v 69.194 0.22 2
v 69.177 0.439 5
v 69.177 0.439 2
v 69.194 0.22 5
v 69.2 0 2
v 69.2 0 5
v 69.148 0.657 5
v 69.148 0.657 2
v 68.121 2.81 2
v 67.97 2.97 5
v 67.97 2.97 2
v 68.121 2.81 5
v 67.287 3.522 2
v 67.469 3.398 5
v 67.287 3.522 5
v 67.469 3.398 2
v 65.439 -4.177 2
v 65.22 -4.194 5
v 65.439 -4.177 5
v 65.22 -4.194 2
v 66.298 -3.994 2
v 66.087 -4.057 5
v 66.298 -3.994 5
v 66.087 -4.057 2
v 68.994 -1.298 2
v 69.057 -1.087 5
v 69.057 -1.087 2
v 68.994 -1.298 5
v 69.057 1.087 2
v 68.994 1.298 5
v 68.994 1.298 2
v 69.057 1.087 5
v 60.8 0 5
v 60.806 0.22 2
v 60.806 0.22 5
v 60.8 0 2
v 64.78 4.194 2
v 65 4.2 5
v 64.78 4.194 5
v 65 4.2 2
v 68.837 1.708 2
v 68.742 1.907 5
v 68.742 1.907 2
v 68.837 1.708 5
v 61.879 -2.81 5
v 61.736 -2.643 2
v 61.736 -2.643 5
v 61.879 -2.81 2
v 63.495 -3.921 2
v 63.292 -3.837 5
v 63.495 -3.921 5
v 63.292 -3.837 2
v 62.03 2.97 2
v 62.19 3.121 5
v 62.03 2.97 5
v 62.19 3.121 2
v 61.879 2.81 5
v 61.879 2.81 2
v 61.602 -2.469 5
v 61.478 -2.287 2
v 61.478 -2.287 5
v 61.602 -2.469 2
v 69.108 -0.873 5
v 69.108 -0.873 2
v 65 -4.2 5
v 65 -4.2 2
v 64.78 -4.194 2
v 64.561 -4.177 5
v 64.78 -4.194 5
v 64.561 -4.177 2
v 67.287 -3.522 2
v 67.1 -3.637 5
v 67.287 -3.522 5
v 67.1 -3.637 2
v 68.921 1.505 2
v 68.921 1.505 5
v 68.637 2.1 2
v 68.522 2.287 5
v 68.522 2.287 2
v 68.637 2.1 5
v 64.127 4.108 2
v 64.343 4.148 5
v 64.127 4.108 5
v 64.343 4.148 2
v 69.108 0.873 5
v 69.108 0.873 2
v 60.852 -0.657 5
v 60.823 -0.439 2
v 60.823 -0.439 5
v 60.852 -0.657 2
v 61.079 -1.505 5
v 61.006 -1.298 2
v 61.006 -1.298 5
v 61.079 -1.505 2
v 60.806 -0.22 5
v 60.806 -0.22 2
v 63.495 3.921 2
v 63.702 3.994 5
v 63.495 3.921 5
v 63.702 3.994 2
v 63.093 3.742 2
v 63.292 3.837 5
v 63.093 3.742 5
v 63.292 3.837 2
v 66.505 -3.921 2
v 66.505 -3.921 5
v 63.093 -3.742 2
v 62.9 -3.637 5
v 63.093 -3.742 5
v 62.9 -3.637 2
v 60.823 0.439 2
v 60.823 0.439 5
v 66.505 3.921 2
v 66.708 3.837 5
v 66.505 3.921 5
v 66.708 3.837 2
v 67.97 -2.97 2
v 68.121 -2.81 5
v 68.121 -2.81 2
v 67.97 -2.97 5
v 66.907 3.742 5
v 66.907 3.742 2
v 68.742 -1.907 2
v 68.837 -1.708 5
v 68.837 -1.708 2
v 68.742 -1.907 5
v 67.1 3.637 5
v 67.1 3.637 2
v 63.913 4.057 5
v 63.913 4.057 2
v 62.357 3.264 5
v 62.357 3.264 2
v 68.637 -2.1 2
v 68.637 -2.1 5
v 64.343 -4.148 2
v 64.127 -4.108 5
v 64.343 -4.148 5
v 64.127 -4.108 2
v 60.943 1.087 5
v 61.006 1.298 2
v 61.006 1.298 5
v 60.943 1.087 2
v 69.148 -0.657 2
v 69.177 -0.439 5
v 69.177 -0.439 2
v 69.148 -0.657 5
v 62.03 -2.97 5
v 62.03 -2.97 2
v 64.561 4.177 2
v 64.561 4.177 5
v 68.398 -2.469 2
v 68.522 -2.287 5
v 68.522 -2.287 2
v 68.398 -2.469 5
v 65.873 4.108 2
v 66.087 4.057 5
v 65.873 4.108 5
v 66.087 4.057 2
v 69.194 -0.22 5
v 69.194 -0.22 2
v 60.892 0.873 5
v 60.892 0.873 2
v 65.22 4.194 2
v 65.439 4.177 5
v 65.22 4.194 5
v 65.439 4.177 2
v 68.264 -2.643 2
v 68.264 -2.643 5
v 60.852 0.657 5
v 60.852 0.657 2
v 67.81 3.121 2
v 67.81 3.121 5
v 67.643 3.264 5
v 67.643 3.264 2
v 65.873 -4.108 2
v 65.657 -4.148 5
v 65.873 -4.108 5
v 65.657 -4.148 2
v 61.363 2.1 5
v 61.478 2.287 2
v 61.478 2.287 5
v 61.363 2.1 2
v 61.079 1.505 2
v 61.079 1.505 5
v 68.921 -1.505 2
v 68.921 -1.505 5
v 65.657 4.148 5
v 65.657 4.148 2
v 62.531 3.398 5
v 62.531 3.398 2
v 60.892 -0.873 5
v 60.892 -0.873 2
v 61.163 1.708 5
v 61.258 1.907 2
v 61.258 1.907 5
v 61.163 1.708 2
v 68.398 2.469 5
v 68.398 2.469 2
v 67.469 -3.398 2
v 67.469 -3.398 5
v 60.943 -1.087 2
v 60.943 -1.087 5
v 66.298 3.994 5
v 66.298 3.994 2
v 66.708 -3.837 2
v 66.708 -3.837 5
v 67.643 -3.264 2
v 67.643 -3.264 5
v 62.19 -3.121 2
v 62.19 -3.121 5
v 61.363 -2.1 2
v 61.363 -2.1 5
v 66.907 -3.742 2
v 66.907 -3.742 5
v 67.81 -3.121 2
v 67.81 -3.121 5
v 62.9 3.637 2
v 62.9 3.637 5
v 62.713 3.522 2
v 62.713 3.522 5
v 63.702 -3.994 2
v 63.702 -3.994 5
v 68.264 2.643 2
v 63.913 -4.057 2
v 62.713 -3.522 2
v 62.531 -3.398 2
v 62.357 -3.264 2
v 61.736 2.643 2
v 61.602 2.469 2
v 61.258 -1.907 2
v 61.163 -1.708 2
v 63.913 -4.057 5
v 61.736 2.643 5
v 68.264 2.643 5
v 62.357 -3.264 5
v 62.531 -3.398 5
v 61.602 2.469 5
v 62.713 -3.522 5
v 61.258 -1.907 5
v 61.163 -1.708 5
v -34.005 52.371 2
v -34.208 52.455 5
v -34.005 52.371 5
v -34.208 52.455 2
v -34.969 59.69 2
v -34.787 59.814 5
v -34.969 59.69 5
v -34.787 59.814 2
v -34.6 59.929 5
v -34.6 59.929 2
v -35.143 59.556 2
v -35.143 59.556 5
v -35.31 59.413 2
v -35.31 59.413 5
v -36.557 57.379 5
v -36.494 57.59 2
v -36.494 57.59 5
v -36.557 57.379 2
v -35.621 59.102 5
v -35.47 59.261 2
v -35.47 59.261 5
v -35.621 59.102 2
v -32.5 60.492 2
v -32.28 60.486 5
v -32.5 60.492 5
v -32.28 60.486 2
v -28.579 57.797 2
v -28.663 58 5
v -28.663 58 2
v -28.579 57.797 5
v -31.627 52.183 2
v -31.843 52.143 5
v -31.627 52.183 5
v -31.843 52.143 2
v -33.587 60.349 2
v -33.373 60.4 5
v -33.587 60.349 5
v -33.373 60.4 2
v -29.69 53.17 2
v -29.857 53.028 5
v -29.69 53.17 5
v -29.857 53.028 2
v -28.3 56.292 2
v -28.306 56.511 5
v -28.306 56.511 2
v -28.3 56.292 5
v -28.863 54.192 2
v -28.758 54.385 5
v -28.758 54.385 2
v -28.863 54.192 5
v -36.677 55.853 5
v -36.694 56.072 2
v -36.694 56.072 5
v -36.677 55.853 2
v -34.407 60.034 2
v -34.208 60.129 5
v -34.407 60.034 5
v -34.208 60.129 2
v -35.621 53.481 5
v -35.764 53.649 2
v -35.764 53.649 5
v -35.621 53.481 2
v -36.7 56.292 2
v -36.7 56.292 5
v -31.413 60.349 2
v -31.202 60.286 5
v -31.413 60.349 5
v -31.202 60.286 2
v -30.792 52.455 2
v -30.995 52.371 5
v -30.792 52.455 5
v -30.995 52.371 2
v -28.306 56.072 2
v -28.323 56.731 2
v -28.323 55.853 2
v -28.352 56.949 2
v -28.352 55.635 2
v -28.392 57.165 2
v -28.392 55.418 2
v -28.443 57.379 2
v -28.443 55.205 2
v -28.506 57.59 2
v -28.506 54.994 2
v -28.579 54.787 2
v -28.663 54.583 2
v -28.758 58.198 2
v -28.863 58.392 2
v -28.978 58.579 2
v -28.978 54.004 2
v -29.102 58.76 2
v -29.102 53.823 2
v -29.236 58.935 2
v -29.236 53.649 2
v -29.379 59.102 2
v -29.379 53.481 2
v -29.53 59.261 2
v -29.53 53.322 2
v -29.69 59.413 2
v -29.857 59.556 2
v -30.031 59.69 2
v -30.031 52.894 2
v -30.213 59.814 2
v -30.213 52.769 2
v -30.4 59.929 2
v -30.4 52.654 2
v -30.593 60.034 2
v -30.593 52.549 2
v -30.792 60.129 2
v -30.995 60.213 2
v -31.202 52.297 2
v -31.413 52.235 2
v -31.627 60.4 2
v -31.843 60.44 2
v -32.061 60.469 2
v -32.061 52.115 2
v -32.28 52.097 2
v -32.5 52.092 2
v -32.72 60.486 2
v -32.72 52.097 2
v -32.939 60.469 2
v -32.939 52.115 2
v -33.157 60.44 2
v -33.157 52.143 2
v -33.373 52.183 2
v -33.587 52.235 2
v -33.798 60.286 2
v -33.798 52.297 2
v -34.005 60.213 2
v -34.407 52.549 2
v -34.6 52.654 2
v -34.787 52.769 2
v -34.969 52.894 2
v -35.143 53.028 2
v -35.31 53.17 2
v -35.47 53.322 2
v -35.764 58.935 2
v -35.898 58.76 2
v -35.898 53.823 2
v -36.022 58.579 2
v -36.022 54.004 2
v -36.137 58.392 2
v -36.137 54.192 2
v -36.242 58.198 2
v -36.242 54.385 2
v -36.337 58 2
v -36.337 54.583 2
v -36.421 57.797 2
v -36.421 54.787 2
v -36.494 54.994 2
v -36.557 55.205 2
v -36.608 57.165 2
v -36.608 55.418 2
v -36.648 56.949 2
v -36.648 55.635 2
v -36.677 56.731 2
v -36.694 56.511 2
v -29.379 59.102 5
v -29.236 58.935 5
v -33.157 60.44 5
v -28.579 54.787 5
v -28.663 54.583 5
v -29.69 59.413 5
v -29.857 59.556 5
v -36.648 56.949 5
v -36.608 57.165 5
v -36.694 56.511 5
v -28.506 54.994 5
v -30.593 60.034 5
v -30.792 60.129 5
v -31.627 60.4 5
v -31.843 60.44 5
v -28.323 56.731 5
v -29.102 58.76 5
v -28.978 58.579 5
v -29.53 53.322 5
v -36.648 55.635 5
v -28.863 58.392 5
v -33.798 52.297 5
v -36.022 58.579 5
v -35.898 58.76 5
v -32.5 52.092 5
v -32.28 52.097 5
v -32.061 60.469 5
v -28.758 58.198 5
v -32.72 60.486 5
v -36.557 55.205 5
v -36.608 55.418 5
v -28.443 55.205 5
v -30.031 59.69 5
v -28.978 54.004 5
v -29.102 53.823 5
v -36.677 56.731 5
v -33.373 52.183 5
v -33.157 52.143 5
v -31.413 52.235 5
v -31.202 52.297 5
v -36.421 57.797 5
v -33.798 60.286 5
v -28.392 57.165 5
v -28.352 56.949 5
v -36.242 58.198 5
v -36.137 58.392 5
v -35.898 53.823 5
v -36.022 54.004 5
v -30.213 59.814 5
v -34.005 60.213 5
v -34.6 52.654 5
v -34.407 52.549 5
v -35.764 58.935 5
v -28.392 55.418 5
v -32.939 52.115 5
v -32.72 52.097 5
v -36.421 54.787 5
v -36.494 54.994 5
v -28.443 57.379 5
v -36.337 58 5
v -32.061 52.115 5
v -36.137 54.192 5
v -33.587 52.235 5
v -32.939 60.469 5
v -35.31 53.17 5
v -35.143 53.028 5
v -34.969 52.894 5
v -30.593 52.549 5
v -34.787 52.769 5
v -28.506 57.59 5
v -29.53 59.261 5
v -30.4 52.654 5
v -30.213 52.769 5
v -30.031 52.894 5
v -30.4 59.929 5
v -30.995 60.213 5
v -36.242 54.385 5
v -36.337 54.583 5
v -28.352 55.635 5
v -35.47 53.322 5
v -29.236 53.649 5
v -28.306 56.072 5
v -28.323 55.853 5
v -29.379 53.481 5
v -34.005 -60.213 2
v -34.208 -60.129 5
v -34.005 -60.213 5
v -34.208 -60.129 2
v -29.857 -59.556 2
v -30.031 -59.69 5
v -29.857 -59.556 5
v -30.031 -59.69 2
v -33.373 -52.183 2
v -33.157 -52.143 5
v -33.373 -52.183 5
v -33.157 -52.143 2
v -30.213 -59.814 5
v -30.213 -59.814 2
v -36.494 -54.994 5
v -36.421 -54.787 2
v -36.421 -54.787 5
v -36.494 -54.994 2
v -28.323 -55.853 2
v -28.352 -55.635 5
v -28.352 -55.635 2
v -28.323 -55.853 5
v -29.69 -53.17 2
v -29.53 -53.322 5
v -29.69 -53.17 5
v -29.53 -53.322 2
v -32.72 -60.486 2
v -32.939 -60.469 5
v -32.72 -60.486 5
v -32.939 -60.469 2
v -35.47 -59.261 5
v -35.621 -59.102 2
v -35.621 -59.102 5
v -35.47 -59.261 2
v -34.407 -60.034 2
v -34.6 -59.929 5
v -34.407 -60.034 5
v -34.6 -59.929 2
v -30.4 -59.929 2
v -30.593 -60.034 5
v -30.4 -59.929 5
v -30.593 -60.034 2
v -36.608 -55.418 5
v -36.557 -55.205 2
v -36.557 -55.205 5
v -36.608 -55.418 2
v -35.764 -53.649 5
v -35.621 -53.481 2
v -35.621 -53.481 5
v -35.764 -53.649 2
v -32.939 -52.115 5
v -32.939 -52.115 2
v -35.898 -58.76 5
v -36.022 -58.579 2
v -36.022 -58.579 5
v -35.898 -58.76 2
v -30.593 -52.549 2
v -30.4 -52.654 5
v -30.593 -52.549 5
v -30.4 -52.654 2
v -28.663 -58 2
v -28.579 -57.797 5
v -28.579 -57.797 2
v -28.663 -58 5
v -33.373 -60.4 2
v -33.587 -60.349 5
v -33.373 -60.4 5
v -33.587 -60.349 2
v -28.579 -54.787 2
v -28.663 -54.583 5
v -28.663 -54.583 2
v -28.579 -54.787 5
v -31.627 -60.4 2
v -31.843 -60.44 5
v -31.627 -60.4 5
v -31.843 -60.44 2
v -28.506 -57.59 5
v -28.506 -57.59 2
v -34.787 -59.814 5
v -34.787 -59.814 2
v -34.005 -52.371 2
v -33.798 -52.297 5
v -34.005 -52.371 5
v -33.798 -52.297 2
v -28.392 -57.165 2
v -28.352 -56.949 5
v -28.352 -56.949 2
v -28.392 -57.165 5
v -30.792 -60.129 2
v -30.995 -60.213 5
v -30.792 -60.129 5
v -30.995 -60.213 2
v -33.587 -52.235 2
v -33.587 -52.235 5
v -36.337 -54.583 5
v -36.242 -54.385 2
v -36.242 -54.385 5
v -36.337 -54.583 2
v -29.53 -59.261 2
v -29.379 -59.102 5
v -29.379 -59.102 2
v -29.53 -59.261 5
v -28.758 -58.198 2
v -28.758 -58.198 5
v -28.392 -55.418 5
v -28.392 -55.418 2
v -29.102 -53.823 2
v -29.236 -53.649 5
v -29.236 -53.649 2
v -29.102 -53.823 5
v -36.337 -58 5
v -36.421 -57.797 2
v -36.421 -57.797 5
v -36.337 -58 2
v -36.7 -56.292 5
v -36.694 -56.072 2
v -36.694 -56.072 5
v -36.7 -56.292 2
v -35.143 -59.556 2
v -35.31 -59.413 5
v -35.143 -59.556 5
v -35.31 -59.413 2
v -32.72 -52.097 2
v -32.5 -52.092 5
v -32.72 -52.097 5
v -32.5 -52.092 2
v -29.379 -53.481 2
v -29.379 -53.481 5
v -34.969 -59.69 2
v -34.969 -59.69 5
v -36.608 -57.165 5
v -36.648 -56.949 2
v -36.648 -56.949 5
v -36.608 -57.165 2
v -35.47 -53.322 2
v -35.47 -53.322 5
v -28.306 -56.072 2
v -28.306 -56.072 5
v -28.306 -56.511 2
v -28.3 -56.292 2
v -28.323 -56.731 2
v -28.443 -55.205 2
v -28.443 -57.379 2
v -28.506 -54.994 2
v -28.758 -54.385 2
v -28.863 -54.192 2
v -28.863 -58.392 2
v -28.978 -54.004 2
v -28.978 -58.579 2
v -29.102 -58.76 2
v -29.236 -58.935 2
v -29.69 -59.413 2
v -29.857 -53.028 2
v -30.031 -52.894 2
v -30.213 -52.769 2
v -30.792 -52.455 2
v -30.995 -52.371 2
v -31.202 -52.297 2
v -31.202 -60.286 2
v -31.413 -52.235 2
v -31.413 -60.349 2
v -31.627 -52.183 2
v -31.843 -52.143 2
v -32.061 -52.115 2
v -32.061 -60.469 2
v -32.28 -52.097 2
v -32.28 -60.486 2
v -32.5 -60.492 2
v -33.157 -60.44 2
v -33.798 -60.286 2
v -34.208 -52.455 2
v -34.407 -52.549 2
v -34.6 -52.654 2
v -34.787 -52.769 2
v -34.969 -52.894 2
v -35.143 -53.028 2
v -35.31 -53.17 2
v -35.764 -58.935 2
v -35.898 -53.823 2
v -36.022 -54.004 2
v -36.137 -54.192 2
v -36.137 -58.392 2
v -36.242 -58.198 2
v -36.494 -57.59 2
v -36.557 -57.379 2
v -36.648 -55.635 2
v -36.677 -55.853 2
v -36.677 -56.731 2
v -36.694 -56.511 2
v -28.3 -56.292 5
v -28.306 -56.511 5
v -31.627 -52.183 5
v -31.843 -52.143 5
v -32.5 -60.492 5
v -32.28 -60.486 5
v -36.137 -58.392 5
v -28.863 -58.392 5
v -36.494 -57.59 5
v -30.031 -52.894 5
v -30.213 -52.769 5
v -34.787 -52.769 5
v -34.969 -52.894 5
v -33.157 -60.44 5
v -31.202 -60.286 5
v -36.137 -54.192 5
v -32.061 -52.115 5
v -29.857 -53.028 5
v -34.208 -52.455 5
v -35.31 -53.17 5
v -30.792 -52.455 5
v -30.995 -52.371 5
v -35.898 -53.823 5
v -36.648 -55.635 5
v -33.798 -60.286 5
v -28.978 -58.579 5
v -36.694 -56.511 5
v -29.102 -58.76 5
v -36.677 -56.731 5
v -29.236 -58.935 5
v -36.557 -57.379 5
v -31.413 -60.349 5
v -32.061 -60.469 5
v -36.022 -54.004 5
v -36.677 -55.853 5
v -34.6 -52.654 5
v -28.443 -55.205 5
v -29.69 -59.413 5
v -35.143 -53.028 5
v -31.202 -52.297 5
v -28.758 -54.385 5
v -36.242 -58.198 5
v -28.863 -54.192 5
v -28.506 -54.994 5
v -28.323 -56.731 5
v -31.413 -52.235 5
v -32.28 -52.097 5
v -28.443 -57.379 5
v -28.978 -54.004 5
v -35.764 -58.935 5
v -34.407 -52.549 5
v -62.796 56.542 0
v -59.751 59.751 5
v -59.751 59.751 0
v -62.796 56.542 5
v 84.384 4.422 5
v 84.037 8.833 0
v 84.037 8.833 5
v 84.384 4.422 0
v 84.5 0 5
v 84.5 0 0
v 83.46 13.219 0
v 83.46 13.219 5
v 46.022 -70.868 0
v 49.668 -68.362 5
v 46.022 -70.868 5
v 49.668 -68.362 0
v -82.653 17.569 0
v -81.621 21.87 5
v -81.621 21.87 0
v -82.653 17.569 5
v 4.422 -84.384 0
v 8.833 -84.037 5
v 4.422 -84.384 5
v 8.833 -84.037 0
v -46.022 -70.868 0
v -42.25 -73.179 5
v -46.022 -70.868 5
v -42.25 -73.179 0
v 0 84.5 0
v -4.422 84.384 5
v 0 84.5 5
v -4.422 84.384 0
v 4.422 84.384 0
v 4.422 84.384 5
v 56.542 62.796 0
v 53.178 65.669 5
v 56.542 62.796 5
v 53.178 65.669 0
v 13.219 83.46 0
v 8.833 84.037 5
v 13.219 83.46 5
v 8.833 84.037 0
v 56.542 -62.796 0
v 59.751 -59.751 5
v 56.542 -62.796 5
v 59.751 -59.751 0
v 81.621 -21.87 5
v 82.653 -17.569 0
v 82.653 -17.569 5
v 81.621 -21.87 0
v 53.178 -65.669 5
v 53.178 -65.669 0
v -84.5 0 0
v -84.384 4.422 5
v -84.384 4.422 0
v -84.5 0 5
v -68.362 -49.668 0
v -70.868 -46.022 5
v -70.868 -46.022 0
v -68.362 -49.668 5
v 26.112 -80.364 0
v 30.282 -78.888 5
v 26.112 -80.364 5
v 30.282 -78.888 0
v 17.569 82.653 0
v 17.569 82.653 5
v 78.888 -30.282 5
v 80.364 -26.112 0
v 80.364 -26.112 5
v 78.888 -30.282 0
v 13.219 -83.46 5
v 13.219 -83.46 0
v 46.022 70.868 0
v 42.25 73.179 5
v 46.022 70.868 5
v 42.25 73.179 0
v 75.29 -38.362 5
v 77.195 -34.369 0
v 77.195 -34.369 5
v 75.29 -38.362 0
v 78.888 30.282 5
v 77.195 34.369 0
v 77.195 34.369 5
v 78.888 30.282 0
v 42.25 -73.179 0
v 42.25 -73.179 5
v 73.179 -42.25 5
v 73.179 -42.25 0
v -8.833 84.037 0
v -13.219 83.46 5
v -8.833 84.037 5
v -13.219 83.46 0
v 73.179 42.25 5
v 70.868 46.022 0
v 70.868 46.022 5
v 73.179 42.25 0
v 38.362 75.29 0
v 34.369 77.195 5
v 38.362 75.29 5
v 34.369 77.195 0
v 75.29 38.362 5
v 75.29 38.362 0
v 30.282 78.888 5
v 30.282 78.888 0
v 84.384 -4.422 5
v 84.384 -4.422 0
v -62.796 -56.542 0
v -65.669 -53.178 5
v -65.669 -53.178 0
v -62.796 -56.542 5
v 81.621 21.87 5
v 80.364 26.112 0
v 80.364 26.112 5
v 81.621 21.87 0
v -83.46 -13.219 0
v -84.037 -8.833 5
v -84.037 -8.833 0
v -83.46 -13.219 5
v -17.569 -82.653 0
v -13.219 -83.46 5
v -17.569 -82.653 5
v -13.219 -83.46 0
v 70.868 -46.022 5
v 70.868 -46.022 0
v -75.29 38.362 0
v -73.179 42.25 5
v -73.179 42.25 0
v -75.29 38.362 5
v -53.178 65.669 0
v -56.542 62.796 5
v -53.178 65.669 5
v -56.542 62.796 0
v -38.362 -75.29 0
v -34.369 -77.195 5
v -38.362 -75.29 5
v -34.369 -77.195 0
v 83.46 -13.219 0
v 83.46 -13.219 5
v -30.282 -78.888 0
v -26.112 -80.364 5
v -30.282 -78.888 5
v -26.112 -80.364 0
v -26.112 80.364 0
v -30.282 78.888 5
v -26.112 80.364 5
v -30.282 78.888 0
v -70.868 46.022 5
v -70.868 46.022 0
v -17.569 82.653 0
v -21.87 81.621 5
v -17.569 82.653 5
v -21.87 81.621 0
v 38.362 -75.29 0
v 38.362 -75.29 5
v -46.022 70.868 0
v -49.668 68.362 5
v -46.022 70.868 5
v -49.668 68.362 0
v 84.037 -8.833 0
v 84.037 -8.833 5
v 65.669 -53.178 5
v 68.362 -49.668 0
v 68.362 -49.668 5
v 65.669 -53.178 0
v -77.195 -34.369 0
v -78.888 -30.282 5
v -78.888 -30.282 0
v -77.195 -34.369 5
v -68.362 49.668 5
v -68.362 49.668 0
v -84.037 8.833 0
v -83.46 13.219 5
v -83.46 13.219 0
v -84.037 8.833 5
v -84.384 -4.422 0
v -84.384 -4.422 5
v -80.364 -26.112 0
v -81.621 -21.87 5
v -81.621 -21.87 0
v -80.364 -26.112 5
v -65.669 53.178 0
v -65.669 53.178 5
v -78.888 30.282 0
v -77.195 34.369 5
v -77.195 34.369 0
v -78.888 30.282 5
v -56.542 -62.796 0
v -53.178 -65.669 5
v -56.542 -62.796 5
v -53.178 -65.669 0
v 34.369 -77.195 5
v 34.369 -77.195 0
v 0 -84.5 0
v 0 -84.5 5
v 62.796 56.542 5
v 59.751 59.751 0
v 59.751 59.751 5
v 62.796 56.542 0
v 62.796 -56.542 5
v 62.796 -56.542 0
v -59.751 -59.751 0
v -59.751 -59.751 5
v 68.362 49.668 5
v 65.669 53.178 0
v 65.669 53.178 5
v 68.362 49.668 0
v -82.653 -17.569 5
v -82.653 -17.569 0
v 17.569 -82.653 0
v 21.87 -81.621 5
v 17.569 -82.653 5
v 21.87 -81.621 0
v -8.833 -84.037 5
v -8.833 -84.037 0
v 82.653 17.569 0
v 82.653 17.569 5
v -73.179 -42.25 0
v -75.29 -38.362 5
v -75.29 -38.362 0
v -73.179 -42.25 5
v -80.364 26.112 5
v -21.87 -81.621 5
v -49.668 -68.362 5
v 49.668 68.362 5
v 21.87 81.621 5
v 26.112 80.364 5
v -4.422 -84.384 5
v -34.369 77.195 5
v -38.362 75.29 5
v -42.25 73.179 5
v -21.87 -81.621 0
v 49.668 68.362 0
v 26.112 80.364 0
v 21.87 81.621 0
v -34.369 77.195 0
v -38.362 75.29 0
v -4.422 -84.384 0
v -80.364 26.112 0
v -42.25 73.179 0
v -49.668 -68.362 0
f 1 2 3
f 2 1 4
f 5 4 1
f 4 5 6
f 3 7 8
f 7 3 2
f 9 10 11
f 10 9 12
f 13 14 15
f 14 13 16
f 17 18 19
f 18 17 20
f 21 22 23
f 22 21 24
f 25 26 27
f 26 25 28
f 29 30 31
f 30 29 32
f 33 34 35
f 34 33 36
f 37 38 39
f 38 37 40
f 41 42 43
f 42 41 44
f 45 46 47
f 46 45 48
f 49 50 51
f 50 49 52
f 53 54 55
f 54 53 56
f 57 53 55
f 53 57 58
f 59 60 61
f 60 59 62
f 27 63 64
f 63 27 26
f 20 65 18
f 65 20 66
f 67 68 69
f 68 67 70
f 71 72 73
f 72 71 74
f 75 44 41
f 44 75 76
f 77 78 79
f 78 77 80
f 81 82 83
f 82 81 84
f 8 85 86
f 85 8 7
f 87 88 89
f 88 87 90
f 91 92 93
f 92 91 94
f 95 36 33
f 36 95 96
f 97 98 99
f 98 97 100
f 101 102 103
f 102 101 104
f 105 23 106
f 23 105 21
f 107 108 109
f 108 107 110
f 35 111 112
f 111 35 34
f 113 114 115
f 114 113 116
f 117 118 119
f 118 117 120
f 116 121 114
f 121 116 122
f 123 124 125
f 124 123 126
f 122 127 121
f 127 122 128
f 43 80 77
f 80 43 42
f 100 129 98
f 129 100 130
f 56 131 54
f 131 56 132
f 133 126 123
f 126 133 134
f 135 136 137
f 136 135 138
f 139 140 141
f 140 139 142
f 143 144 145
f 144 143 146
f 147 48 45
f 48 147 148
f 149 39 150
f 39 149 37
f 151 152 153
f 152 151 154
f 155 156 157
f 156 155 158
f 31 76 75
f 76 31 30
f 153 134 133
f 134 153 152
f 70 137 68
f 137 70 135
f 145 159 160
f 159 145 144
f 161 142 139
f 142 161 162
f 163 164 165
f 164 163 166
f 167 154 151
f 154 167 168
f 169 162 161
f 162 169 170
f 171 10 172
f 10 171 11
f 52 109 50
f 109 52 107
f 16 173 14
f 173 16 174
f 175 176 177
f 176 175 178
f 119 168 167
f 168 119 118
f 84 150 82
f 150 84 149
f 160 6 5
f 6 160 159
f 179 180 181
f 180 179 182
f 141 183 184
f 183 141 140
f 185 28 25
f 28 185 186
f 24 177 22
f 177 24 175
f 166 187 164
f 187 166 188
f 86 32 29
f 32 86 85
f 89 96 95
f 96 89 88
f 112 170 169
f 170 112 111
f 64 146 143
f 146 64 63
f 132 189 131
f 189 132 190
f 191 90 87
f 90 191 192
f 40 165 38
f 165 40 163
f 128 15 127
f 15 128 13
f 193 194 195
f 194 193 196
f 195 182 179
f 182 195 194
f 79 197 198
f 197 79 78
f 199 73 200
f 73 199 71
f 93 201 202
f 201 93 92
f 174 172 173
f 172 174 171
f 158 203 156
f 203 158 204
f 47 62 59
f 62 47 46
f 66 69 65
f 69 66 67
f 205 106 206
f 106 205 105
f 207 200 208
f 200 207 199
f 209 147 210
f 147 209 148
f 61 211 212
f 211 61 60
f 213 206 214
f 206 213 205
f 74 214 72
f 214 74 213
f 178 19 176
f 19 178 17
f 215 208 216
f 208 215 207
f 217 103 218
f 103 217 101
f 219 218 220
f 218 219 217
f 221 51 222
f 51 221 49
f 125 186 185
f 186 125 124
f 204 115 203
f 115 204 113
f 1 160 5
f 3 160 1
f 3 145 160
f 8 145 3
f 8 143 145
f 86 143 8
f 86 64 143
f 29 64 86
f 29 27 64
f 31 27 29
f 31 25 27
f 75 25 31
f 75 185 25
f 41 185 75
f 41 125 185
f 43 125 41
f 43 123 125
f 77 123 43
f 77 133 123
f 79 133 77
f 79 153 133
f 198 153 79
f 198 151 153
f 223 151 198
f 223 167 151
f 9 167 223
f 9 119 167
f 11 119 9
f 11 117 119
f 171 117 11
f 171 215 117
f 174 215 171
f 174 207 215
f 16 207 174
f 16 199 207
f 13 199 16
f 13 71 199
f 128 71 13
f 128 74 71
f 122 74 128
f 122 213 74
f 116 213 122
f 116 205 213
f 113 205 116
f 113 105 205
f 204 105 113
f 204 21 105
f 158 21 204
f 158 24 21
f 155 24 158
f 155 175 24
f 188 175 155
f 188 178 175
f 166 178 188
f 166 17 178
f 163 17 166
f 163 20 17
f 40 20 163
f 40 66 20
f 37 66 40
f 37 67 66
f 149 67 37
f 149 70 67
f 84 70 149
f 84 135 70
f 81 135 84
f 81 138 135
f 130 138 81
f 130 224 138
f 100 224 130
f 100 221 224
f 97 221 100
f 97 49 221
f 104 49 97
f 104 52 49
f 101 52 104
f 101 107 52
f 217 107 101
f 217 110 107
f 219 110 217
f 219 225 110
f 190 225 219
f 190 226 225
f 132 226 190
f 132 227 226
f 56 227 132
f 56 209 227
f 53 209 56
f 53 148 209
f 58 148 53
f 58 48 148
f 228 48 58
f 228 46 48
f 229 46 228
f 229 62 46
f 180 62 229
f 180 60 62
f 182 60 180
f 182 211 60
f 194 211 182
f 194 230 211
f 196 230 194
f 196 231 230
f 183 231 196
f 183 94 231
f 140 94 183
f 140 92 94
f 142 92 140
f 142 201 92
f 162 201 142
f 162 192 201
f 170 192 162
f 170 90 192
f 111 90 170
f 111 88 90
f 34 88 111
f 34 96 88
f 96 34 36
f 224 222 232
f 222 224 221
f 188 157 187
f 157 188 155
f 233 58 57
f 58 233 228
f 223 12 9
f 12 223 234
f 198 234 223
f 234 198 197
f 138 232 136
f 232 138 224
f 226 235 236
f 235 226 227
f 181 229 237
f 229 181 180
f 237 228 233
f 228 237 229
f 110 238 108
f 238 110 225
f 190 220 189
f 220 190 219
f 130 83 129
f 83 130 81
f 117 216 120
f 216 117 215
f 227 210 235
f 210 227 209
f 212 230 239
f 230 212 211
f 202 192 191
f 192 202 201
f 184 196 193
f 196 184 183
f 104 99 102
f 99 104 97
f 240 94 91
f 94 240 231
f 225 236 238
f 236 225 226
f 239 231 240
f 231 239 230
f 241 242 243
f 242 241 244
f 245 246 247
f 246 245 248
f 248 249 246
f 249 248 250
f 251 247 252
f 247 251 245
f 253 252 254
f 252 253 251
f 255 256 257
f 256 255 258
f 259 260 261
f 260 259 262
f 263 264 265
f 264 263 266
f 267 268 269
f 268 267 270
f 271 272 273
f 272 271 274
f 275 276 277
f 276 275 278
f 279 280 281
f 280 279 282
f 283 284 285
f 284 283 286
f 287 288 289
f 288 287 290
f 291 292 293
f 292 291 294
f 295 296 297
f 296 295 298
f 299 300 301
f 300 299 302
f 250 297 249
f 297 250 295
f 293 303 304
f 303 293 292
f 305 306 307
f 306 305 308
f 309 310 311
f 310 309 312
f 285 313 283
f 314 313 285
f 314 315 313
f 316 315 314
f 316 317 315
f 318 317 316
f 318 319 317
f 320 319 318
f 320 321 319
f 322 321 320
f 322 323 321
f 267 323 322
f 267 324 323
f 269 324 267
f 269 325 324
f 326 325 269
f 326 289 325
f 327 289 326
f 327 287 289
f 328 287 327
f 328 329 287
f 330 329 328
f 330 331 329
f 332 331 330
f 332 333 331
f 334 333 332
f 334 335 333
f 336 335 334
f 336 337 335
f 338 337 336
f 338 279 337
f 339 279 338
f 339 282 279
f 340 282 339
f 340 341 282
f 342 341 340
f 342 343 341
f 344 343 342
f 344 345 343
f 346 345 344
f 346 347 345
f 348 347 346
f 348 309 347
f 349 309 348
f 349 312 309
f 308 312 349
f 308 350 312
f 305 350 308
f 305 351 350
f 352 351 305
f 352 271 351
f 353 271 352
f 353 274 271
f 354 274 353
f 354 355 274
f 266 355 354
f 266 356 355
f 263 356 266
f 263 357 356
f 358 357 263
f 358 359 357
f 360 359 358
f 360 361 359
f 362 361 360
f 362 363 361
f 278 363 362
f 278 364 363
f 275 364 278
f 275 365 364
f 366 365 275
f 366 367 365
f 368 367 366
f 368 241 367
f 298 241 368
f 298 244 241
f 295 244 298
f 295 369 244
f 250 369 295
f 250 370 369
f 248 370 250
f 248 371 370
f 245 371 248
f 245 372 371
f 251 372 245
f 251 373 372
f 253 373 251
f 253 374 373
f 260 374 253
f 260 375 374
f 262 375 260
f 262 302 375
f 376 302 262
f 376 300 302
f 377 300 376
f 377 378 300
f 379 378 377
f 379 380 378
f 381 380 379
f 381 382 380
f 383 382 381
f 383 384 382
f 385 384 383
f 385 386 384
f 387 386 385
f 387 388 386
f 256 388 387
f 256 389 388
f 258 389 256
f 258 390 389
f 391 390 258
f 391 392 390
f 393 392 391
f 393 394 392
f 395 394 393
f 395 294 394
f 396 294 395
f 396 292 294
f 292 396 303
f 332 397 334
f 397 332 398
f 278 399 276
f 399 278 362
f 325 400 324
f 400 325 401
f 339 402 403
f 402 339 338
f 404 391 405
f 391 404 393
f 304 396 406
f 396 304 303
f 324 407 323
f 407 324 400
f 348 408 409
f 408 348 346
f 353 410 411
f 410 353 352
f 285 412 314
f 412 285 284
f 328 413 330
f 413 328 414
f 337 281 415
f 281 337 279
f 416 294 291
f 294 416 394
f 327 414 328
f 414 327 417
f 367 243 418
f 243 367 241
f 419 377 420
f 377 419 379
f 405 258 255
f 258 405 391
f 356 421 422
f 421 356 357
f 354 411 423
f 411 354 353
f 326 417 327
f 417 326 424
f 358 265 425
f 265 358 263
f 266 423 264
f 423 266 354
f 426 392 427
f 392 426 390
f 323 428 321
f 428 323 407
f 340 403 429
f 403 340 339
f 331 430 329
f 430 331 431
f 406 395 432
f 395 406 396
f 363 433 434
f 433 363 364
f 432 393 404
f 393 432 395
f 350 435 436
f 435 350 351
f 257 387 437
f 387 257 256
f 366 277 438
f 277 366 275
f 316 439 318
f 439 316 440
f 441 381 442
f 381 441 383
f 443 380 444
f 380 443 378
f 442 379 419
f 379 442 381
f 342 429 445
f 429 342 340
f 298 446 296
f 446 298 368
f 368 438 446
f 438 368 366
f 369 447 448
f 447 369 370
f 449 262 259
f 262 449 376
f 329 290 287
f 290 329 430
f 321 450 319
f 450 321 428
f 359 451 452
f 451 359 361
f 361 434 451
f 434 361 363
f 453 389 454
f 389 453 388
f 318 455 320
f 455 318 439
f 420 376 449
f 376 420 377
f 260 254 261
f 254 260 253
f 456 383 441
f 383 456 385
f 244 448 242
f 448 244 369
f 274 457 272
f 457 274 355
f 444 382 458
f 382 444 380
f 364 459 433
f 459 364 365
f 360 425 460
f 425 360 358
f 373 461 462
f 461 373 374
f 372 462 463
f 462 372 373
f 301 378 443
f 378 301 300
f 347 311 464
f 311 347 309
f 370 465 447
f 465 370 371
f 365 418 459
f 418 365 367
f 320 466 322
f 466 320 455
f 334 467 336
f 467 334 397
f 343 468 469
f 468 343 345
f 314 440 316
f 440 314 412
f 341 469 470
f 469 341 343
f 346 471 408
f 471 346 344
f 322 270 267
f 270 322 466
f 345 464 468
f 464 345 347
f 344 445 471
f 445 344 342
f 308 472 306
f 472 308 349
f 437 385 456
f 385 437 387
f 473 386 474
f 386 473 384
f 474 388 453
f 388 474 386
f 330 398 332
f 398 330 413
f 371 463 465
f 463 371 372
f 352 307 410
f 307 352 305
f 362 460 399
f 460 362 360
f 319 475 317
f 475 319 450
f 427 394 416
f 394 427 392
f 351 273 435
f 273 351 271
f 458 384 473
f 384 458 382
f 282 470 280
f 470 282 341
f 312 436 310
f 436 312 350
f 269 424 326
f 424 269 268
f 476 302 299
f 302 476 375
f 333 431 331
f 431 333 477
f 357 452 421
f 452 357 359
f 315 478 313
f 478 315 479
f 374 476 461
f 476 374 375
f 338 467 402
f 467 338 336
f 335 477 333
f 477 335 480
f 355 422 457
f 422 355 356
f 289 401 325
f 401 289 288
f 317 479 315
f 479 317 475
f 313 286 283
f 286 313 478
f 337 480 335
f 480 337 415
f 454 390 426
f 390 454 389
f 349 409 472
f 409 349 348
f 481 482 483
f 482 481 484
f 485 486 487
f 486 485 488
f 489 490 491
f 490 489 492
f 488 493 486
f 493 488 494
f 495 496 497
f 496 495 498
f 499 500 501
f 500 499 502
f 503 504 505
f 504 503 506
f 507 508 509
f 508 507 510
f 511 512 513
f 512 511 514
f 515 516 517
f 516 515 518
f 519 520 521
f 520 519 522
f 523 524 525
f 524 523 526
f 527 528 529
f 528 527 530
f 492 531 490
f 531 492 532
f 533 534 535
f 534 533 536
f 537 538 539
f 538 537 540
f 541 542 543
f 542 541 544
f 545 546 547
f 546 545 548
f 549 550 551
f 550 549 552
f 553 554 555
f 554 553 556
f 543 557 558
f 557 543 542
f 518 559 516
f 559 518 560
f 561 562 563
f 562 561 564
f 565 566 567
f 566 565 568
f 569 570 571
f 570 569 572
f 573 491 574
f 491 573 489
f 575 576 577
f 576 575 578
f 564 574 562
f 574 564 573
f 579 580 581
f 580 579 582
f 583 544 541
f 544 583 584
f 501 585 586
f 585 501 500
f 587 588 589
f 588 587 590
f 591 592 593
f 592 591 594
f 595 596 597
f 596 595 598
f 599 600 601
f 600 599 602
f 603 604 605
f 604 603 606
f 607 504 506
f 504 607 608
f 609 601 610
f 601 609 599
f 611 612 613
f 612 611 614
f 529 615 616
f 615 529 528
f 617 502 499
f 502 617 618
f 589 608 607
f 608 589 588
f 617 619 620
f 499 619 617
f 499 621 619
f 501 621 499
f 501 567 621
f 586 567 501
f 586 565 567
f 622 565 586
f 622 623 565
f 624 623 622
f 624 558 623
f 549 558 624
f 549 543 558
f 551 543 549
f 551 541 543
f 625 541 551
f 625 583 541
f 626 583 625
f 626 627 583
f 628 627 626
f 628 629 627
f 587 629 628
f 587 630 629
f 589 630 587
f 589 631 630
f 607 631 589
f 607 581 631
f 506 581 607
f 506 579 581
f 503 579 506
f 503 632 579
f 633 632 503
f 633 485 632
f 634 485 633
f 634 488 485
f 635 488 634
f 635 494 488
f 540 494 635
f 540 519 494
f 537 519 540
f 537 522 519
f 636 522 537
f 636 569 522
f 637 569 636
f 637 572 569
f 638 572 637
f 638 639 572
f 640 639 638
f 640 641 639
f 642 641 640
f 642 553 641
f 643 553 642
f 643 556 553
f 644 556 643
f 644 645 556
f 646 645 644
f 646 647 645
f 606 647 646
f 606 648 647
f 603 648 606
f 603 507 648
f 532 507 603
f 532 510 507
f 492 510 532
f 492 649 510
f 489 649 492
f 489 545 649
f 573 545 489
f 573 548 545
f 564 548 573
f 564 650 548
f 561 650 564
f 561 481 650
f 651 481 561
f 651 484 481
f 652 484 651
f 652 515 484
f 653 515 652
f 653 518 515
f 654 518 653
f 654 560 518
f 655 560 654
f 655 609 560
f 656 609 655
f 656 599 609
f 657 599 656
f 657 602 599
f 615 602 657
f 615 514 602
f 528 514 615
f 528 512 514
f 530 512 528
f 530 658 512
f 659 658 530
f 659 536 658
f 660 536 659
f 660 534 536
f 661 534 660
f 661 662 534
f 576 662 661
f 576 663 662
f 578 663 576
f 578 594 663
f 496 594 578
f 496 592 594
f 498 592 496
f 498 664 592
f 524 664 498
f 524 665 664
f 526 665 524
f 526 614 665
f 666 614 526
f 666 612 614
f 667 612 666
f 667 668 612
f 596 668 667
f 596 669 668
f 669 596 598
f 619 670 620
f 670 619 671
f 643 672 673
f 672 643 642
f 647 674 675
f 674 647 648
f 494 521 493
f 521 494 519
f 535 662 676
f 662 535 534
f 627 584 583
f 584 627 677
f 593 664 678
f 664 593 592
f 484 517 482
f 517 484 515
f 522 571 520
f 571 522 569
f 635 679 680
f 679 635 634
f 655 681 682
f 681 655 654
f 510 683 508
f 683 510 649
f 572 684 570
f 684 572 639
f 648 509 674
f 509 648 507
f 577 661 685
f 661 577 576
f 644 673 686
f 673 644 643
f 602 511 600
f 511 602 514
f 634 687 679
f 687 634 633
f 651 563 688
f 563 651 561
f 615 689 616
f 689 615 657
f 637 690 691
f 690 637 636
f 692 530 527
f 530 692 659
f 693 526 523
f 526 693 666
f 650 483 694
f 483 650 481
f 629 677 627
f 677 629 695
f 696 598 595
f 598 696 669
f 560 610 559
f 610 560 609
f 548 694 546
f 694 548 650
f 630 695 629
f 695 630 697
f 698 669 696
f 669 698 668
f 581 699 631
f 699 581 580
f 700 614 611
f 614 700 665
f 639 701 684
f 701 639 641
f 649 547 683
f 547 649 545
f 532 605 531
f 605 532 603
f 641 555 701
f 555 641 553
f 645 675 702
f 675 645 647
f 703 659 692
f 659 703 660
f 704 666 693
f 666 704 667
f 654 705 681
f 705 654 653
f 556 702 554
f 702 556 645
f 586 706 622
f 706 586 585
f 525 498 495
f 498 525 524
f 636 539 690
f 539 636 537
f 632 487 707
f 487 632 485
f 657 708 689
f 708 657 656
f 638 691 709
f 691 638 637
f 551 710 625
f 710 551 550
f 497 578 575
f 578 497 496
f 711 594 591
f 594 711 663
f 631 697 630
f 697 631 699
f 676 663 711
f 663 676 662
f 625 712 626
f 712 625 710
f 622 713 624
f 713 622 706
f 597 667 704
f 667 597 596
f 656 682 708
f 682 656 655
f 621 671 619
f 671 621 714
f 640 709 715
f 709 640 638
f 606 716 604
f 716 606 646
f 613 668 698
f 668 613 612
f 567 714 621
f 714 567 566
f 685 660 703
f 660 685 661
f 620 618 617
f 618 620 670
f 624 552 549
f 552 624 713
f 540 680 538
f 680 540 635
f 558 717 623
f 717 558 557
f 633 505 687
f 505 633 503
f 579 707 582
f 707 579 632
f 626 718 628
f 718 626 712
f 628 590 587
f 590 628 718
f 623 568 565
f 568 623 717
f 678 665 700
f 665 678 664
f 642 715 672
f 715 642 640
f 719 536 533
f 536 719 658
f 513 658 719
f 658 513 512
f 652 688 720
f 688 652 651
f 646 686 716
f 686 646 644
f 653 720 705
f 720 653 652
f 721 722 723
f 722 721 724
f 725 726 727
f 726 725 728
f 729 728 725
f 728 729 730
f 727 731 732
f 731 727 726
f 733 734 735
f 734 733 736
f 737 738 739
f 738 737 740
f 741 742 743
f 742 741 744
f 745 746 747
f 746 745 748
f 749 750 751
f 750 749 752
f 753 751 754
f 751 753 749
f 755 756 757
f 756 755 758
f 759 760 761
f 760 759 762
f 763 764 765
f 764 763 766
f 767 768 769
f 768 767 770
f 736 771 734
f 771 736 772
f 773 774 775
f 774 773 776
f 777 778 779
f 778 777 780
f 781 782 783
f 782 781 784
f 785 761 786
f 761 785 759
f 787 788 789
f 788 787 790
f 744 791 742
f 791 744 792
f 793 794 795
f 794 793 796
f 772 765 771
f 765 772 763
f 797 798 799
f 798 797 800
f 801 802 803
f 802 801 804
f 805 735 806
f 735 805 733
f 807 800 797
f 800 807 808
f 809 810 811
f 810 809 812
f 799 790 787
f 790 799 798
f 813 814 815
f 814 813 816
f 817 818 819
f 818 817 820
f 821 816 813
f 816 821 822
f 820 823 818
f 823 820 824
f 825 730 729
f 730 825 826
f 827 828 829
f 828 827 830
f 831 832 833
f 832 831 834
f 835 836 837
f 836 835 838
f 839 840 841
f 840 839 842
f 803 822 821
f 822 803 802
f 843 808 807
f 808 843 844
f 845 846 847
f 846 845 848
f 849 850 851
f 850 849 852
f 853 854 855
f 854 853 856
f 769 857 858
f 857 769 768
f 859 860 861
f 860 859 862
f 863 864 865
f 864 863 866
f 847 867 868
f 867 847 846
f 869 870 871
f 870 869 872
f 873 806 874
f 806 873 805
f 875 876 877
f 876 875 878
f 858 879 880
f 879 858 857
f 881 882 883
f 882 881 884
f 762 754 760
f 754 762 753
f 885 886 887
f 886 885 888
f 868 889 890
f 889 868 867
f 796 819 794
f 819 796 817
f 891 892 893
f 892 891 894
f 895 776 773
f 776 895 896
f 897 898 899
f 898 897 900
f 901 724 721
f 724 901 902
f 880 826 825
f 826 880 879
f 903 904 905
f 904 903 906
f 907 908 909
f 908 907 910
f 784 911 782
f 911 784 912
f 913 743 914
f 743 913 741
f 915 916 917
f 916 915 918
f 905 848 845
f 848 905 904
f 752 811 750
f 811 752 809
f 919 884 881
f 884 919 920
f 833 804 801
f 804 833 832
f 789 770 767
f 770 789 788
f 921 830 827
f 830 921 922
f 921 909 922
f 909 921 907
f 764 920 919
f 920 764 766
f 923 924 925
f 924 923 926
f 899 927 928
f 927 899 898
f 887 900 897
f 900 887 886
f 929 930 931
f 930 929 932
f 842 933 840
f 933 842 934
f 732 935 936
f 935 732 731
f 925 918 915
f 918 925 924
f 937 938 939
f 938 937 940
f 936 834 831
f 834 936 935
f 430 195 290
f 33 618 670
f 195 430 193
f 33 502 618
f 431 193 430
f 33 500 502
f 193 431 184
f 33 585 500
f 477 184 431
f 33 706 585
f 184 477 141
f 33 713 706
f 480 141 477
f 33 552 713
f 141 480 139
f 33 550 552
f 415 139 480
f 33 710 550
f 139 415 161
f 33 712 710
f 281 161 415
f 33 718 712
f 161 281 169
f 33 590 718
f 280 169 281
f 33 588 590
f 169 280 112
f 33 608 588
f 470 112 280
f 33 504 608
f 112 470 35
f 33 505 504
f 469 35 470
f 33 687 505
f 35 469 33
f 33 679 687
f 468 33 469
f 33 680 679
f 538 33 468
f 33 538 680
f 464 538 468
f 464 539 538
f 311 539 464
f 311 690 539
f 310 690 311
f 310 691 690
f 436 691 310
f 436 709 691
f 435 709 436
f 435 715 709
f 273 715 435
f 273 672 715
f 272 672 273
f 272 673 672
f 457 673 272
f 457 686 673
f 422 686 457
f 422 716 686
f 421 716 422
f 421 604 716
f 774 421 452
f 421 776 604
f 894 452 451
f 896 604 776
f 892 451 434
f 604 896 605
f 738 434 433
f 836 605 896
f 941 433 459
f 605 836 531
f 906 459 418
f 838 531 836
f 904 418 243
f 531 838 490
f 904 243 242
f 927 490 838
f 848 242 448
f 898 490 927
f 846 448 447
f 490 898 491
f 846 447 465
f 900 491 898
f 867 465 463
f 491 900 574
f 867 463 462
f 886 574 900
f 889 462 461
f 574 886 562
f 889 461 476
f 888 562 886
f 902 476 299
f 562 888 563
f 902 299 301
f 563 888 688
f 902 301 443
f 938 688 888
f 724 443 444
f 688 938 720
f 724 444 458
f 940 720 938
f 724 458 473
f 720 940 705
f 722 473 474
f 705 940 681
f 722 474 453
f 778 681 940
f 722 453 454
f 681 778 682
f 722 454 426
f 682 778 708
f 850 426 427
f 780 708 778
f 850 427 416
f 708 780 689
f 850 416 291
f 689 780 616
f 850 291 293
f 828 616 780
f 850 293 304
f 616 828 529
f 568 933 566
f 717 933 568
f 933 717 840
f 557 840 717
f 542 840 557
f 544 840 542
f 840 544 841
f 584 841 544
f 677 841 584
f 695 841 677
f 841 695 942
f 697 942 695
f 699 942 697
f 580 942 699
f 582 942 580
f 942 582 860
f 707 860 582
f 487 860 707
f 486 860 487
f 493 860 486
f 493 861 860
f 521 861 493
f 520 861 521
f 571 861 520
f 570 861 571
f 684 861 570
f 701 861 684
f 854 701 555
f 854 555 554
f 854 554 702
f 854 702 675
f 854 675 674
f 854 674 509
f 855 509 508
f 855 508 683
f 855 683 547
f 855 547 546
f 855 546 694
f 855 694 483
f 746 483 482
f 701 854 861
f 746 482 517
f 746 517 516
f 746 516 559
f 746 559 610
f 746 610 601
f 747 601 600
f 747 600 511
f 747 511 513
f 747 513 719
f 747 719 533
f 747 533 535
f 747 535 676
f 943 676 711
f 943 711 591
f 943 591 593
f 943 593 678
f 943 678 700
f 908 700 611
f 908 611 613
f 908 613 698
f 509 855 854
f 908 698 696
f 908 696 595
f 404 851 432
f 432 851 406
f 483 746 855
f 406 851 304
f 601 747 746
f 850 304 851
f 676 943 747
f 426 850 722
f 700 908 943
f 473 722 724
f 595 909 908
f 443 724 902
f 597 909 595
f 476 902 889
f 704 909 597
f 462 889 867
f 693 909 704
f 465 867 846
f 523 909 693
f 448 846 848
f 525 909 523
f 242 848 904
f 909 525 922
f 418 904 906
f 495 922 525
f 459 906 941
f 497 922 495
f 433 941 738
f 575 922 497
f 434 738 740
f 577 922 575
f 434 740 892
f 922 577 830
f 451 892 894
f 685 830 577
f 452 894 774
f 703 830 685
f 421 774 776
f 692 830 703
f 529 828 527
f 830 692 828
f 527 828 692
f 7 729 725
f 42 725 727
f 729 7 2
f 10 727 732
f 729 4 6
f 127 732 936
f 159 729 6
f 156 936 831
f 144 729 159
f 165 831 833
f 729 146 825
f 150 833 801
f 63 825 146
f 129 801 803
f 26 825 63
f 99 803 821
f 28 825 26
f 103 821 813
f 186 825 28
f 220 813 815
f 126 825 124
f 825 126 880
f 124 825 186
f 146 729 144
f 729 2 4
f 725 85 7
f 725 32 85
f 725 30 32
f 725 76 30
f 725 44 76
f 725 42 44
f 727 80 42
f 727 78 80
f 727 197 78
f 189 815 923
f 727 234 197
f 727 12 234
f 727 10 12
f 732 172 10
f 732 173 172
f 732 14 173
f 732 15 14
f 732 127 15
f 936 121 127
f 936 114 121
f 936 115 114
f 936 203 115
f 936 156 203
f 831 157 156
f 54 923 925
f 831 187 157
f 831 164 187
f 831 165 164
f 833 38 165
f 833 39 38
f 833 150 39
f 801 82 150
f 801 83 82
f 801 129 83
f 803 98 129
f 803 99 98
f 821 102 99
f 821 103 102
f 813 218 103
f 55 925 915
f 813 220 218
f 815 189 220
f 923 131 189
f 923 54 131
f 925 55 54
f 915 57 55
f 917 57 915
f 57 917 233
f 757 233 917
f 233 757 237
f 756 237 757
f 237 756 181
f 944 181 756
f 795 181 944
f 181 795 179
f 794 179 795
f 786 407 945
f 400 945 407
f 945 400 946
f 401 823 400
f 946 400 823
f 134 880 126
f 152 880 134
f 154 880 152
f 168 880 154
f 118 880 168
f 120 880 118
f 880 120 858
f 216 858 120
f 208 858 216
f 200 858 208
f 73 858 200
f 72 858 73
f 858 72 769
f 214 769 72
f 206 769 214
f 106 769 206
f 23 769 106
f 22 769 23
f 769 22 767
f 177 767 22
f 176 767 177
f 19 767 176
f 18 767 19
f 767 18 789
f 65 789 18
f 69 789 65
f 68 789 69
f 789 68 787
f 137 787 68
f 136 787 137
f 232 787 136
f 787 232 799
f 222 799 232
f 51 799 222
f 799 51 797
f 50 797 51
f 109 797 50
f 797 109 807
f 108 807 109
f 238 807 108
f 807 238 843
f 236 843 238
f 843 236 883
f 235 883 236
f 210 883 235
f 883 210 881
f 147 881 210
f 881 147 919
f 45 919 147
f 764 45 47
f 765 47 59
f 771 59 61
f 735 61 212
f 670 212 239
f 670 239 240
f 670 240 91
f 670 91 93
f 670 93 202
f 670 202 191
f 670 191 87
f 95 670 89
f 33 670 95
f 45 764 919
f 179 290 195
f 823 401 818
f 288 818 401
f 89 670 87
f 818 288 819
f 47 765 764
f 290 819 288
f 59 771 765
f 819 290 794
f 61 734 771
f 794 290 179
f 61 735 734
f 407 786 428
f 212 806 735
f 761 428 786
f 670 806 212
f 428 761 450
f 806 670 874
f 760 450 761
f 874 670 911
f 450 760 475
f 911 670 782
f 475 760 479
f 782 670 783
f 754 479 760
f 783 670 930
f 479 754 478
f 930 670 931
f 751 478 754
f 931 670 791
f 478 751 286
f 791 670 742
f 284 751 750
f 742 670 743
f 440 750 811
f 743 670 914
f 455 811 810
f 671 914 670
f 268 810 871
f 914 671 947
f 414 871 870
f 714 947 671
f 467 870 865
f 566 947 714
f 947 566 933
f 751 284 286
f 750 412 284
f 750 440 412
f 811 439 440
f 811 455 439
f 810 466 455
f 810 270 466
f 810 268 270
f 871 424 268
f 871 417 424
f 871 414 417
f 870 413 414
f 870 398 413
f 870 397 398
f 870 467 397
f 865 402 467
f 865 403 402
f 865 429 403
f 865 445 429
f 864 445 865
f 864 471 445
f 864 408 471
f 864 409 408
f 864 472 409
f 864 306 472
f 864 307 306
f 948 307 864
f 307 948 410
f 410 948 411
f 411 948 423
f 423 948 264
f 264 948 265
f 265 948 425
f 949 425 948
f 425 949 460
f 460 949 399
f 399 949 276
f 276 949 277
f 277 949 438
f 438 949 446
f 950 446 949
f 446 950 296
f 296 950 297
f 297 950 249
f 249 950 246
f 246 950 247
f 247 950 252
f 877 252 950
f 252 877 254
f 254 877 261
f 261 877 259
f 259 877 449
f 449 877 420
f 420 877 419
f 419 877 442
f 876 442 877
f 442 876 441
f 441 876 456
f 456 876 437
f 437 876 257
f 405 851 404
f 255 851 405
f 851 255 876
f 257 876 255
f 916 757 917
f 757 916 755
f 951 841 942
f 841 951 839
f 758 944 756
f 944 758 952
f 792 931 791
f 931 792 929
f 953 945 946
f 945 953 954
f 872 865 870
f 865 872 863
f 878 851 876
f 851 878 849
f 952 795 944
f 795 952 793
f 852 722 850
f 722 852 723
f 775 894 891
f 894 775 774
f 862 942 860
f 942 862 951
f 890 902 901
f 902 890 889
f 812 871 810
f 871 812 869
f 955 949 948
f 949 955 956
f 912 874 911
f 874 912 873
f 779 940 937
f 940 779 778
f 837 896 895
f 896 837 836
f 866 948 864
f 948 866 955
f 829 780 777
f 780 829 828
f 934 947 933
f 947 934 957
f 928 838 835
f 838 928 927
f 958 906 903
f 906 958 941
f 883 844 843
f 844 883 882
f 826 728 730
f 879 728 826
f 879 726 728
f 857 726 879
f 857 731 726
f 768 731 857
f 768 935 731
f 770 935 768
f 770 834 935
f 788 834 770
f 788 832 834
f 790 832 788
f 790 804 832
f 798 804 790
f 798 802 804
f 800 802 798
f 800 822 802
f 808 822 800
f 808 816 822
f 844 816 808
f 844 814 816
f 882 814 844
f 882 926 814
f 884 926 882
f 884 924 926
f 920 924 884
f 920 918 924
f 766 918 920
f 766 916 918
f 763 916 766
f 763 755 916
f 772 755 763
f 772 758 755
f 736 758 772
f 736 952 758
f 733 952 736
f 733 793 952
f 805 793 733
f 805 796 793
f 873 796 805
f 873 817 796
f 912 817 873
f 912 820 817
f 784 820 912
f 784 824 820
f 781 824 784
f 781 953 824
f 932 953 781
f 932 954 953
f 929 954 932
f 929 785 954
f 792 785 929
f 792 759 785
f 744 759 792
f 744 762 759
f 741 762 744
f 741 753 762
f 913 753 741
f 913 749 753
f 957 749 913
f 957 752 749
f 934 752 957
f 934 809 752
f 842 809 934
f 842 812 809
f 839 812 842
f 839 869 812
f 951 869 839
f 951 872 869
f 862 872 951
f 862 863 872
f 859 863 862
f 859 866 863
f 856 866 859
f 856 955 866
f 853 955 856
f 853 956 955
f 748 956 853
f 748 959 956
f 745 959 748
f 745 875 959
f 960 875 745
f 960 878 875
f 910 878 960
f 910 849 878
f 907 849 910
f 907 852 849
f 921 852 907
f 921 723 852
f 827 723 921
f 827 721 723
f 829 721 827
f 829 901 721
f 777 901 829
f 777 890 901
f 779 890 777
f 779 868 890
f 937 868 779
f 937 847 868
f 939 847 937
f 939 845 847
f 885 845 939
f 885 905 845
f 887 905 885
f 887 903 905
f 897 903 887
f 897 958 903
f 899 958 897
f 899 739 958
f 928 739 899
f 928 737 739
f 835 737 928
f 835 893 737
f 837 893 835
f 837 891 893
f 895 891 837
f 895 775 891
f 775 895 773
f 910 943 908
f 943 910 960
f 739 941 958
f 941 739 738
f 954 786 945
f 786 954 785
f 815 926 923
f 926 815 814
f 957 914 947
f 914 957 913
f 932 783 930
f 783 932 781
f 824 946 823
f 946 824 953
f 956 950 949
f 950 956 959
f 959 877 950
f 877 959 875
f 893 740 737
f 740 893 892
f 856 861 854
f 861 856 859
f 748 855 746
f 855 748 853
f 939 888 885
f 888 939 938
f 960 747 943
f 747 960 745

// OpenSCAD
$fn = 120;

// ==========================================
// PRINT FILE: Scale Pan Adapter
// ==========================================
// Sits on the scale pan, receives the 3 post tips from
// the weighing plate above. Increased OD by 3/4" to
// account for scale-to-box alignment offset.
//
// Print flat, socket side UP. PLA, no supports.
// ==========================================

pan_adapter_od     = 169.0;    // was 150, +3/4" for alignment
pan_adapter_h      = 5.0;
post_od            = 8.0;
post_count         = 3;
bolt_circle_r      = 65.0;
post_socket_depth  = 3.0;
post_socket_d      = post_od + 0.4;  // 8.4mm

difference() {
    cylinder(d = pan_adapter_od, h = pan_adapter_h);

    // 3 post sockets
    for (i = [0 : post_count-1]) {
        rotate([0, 0, i * 120])
            translate([bolt_circle_r, 0, pan_adapter_h - post_socket_depth])
                cylinder(d = post_socket_d, h = post_socket_depth + 0.1);
    }
}
